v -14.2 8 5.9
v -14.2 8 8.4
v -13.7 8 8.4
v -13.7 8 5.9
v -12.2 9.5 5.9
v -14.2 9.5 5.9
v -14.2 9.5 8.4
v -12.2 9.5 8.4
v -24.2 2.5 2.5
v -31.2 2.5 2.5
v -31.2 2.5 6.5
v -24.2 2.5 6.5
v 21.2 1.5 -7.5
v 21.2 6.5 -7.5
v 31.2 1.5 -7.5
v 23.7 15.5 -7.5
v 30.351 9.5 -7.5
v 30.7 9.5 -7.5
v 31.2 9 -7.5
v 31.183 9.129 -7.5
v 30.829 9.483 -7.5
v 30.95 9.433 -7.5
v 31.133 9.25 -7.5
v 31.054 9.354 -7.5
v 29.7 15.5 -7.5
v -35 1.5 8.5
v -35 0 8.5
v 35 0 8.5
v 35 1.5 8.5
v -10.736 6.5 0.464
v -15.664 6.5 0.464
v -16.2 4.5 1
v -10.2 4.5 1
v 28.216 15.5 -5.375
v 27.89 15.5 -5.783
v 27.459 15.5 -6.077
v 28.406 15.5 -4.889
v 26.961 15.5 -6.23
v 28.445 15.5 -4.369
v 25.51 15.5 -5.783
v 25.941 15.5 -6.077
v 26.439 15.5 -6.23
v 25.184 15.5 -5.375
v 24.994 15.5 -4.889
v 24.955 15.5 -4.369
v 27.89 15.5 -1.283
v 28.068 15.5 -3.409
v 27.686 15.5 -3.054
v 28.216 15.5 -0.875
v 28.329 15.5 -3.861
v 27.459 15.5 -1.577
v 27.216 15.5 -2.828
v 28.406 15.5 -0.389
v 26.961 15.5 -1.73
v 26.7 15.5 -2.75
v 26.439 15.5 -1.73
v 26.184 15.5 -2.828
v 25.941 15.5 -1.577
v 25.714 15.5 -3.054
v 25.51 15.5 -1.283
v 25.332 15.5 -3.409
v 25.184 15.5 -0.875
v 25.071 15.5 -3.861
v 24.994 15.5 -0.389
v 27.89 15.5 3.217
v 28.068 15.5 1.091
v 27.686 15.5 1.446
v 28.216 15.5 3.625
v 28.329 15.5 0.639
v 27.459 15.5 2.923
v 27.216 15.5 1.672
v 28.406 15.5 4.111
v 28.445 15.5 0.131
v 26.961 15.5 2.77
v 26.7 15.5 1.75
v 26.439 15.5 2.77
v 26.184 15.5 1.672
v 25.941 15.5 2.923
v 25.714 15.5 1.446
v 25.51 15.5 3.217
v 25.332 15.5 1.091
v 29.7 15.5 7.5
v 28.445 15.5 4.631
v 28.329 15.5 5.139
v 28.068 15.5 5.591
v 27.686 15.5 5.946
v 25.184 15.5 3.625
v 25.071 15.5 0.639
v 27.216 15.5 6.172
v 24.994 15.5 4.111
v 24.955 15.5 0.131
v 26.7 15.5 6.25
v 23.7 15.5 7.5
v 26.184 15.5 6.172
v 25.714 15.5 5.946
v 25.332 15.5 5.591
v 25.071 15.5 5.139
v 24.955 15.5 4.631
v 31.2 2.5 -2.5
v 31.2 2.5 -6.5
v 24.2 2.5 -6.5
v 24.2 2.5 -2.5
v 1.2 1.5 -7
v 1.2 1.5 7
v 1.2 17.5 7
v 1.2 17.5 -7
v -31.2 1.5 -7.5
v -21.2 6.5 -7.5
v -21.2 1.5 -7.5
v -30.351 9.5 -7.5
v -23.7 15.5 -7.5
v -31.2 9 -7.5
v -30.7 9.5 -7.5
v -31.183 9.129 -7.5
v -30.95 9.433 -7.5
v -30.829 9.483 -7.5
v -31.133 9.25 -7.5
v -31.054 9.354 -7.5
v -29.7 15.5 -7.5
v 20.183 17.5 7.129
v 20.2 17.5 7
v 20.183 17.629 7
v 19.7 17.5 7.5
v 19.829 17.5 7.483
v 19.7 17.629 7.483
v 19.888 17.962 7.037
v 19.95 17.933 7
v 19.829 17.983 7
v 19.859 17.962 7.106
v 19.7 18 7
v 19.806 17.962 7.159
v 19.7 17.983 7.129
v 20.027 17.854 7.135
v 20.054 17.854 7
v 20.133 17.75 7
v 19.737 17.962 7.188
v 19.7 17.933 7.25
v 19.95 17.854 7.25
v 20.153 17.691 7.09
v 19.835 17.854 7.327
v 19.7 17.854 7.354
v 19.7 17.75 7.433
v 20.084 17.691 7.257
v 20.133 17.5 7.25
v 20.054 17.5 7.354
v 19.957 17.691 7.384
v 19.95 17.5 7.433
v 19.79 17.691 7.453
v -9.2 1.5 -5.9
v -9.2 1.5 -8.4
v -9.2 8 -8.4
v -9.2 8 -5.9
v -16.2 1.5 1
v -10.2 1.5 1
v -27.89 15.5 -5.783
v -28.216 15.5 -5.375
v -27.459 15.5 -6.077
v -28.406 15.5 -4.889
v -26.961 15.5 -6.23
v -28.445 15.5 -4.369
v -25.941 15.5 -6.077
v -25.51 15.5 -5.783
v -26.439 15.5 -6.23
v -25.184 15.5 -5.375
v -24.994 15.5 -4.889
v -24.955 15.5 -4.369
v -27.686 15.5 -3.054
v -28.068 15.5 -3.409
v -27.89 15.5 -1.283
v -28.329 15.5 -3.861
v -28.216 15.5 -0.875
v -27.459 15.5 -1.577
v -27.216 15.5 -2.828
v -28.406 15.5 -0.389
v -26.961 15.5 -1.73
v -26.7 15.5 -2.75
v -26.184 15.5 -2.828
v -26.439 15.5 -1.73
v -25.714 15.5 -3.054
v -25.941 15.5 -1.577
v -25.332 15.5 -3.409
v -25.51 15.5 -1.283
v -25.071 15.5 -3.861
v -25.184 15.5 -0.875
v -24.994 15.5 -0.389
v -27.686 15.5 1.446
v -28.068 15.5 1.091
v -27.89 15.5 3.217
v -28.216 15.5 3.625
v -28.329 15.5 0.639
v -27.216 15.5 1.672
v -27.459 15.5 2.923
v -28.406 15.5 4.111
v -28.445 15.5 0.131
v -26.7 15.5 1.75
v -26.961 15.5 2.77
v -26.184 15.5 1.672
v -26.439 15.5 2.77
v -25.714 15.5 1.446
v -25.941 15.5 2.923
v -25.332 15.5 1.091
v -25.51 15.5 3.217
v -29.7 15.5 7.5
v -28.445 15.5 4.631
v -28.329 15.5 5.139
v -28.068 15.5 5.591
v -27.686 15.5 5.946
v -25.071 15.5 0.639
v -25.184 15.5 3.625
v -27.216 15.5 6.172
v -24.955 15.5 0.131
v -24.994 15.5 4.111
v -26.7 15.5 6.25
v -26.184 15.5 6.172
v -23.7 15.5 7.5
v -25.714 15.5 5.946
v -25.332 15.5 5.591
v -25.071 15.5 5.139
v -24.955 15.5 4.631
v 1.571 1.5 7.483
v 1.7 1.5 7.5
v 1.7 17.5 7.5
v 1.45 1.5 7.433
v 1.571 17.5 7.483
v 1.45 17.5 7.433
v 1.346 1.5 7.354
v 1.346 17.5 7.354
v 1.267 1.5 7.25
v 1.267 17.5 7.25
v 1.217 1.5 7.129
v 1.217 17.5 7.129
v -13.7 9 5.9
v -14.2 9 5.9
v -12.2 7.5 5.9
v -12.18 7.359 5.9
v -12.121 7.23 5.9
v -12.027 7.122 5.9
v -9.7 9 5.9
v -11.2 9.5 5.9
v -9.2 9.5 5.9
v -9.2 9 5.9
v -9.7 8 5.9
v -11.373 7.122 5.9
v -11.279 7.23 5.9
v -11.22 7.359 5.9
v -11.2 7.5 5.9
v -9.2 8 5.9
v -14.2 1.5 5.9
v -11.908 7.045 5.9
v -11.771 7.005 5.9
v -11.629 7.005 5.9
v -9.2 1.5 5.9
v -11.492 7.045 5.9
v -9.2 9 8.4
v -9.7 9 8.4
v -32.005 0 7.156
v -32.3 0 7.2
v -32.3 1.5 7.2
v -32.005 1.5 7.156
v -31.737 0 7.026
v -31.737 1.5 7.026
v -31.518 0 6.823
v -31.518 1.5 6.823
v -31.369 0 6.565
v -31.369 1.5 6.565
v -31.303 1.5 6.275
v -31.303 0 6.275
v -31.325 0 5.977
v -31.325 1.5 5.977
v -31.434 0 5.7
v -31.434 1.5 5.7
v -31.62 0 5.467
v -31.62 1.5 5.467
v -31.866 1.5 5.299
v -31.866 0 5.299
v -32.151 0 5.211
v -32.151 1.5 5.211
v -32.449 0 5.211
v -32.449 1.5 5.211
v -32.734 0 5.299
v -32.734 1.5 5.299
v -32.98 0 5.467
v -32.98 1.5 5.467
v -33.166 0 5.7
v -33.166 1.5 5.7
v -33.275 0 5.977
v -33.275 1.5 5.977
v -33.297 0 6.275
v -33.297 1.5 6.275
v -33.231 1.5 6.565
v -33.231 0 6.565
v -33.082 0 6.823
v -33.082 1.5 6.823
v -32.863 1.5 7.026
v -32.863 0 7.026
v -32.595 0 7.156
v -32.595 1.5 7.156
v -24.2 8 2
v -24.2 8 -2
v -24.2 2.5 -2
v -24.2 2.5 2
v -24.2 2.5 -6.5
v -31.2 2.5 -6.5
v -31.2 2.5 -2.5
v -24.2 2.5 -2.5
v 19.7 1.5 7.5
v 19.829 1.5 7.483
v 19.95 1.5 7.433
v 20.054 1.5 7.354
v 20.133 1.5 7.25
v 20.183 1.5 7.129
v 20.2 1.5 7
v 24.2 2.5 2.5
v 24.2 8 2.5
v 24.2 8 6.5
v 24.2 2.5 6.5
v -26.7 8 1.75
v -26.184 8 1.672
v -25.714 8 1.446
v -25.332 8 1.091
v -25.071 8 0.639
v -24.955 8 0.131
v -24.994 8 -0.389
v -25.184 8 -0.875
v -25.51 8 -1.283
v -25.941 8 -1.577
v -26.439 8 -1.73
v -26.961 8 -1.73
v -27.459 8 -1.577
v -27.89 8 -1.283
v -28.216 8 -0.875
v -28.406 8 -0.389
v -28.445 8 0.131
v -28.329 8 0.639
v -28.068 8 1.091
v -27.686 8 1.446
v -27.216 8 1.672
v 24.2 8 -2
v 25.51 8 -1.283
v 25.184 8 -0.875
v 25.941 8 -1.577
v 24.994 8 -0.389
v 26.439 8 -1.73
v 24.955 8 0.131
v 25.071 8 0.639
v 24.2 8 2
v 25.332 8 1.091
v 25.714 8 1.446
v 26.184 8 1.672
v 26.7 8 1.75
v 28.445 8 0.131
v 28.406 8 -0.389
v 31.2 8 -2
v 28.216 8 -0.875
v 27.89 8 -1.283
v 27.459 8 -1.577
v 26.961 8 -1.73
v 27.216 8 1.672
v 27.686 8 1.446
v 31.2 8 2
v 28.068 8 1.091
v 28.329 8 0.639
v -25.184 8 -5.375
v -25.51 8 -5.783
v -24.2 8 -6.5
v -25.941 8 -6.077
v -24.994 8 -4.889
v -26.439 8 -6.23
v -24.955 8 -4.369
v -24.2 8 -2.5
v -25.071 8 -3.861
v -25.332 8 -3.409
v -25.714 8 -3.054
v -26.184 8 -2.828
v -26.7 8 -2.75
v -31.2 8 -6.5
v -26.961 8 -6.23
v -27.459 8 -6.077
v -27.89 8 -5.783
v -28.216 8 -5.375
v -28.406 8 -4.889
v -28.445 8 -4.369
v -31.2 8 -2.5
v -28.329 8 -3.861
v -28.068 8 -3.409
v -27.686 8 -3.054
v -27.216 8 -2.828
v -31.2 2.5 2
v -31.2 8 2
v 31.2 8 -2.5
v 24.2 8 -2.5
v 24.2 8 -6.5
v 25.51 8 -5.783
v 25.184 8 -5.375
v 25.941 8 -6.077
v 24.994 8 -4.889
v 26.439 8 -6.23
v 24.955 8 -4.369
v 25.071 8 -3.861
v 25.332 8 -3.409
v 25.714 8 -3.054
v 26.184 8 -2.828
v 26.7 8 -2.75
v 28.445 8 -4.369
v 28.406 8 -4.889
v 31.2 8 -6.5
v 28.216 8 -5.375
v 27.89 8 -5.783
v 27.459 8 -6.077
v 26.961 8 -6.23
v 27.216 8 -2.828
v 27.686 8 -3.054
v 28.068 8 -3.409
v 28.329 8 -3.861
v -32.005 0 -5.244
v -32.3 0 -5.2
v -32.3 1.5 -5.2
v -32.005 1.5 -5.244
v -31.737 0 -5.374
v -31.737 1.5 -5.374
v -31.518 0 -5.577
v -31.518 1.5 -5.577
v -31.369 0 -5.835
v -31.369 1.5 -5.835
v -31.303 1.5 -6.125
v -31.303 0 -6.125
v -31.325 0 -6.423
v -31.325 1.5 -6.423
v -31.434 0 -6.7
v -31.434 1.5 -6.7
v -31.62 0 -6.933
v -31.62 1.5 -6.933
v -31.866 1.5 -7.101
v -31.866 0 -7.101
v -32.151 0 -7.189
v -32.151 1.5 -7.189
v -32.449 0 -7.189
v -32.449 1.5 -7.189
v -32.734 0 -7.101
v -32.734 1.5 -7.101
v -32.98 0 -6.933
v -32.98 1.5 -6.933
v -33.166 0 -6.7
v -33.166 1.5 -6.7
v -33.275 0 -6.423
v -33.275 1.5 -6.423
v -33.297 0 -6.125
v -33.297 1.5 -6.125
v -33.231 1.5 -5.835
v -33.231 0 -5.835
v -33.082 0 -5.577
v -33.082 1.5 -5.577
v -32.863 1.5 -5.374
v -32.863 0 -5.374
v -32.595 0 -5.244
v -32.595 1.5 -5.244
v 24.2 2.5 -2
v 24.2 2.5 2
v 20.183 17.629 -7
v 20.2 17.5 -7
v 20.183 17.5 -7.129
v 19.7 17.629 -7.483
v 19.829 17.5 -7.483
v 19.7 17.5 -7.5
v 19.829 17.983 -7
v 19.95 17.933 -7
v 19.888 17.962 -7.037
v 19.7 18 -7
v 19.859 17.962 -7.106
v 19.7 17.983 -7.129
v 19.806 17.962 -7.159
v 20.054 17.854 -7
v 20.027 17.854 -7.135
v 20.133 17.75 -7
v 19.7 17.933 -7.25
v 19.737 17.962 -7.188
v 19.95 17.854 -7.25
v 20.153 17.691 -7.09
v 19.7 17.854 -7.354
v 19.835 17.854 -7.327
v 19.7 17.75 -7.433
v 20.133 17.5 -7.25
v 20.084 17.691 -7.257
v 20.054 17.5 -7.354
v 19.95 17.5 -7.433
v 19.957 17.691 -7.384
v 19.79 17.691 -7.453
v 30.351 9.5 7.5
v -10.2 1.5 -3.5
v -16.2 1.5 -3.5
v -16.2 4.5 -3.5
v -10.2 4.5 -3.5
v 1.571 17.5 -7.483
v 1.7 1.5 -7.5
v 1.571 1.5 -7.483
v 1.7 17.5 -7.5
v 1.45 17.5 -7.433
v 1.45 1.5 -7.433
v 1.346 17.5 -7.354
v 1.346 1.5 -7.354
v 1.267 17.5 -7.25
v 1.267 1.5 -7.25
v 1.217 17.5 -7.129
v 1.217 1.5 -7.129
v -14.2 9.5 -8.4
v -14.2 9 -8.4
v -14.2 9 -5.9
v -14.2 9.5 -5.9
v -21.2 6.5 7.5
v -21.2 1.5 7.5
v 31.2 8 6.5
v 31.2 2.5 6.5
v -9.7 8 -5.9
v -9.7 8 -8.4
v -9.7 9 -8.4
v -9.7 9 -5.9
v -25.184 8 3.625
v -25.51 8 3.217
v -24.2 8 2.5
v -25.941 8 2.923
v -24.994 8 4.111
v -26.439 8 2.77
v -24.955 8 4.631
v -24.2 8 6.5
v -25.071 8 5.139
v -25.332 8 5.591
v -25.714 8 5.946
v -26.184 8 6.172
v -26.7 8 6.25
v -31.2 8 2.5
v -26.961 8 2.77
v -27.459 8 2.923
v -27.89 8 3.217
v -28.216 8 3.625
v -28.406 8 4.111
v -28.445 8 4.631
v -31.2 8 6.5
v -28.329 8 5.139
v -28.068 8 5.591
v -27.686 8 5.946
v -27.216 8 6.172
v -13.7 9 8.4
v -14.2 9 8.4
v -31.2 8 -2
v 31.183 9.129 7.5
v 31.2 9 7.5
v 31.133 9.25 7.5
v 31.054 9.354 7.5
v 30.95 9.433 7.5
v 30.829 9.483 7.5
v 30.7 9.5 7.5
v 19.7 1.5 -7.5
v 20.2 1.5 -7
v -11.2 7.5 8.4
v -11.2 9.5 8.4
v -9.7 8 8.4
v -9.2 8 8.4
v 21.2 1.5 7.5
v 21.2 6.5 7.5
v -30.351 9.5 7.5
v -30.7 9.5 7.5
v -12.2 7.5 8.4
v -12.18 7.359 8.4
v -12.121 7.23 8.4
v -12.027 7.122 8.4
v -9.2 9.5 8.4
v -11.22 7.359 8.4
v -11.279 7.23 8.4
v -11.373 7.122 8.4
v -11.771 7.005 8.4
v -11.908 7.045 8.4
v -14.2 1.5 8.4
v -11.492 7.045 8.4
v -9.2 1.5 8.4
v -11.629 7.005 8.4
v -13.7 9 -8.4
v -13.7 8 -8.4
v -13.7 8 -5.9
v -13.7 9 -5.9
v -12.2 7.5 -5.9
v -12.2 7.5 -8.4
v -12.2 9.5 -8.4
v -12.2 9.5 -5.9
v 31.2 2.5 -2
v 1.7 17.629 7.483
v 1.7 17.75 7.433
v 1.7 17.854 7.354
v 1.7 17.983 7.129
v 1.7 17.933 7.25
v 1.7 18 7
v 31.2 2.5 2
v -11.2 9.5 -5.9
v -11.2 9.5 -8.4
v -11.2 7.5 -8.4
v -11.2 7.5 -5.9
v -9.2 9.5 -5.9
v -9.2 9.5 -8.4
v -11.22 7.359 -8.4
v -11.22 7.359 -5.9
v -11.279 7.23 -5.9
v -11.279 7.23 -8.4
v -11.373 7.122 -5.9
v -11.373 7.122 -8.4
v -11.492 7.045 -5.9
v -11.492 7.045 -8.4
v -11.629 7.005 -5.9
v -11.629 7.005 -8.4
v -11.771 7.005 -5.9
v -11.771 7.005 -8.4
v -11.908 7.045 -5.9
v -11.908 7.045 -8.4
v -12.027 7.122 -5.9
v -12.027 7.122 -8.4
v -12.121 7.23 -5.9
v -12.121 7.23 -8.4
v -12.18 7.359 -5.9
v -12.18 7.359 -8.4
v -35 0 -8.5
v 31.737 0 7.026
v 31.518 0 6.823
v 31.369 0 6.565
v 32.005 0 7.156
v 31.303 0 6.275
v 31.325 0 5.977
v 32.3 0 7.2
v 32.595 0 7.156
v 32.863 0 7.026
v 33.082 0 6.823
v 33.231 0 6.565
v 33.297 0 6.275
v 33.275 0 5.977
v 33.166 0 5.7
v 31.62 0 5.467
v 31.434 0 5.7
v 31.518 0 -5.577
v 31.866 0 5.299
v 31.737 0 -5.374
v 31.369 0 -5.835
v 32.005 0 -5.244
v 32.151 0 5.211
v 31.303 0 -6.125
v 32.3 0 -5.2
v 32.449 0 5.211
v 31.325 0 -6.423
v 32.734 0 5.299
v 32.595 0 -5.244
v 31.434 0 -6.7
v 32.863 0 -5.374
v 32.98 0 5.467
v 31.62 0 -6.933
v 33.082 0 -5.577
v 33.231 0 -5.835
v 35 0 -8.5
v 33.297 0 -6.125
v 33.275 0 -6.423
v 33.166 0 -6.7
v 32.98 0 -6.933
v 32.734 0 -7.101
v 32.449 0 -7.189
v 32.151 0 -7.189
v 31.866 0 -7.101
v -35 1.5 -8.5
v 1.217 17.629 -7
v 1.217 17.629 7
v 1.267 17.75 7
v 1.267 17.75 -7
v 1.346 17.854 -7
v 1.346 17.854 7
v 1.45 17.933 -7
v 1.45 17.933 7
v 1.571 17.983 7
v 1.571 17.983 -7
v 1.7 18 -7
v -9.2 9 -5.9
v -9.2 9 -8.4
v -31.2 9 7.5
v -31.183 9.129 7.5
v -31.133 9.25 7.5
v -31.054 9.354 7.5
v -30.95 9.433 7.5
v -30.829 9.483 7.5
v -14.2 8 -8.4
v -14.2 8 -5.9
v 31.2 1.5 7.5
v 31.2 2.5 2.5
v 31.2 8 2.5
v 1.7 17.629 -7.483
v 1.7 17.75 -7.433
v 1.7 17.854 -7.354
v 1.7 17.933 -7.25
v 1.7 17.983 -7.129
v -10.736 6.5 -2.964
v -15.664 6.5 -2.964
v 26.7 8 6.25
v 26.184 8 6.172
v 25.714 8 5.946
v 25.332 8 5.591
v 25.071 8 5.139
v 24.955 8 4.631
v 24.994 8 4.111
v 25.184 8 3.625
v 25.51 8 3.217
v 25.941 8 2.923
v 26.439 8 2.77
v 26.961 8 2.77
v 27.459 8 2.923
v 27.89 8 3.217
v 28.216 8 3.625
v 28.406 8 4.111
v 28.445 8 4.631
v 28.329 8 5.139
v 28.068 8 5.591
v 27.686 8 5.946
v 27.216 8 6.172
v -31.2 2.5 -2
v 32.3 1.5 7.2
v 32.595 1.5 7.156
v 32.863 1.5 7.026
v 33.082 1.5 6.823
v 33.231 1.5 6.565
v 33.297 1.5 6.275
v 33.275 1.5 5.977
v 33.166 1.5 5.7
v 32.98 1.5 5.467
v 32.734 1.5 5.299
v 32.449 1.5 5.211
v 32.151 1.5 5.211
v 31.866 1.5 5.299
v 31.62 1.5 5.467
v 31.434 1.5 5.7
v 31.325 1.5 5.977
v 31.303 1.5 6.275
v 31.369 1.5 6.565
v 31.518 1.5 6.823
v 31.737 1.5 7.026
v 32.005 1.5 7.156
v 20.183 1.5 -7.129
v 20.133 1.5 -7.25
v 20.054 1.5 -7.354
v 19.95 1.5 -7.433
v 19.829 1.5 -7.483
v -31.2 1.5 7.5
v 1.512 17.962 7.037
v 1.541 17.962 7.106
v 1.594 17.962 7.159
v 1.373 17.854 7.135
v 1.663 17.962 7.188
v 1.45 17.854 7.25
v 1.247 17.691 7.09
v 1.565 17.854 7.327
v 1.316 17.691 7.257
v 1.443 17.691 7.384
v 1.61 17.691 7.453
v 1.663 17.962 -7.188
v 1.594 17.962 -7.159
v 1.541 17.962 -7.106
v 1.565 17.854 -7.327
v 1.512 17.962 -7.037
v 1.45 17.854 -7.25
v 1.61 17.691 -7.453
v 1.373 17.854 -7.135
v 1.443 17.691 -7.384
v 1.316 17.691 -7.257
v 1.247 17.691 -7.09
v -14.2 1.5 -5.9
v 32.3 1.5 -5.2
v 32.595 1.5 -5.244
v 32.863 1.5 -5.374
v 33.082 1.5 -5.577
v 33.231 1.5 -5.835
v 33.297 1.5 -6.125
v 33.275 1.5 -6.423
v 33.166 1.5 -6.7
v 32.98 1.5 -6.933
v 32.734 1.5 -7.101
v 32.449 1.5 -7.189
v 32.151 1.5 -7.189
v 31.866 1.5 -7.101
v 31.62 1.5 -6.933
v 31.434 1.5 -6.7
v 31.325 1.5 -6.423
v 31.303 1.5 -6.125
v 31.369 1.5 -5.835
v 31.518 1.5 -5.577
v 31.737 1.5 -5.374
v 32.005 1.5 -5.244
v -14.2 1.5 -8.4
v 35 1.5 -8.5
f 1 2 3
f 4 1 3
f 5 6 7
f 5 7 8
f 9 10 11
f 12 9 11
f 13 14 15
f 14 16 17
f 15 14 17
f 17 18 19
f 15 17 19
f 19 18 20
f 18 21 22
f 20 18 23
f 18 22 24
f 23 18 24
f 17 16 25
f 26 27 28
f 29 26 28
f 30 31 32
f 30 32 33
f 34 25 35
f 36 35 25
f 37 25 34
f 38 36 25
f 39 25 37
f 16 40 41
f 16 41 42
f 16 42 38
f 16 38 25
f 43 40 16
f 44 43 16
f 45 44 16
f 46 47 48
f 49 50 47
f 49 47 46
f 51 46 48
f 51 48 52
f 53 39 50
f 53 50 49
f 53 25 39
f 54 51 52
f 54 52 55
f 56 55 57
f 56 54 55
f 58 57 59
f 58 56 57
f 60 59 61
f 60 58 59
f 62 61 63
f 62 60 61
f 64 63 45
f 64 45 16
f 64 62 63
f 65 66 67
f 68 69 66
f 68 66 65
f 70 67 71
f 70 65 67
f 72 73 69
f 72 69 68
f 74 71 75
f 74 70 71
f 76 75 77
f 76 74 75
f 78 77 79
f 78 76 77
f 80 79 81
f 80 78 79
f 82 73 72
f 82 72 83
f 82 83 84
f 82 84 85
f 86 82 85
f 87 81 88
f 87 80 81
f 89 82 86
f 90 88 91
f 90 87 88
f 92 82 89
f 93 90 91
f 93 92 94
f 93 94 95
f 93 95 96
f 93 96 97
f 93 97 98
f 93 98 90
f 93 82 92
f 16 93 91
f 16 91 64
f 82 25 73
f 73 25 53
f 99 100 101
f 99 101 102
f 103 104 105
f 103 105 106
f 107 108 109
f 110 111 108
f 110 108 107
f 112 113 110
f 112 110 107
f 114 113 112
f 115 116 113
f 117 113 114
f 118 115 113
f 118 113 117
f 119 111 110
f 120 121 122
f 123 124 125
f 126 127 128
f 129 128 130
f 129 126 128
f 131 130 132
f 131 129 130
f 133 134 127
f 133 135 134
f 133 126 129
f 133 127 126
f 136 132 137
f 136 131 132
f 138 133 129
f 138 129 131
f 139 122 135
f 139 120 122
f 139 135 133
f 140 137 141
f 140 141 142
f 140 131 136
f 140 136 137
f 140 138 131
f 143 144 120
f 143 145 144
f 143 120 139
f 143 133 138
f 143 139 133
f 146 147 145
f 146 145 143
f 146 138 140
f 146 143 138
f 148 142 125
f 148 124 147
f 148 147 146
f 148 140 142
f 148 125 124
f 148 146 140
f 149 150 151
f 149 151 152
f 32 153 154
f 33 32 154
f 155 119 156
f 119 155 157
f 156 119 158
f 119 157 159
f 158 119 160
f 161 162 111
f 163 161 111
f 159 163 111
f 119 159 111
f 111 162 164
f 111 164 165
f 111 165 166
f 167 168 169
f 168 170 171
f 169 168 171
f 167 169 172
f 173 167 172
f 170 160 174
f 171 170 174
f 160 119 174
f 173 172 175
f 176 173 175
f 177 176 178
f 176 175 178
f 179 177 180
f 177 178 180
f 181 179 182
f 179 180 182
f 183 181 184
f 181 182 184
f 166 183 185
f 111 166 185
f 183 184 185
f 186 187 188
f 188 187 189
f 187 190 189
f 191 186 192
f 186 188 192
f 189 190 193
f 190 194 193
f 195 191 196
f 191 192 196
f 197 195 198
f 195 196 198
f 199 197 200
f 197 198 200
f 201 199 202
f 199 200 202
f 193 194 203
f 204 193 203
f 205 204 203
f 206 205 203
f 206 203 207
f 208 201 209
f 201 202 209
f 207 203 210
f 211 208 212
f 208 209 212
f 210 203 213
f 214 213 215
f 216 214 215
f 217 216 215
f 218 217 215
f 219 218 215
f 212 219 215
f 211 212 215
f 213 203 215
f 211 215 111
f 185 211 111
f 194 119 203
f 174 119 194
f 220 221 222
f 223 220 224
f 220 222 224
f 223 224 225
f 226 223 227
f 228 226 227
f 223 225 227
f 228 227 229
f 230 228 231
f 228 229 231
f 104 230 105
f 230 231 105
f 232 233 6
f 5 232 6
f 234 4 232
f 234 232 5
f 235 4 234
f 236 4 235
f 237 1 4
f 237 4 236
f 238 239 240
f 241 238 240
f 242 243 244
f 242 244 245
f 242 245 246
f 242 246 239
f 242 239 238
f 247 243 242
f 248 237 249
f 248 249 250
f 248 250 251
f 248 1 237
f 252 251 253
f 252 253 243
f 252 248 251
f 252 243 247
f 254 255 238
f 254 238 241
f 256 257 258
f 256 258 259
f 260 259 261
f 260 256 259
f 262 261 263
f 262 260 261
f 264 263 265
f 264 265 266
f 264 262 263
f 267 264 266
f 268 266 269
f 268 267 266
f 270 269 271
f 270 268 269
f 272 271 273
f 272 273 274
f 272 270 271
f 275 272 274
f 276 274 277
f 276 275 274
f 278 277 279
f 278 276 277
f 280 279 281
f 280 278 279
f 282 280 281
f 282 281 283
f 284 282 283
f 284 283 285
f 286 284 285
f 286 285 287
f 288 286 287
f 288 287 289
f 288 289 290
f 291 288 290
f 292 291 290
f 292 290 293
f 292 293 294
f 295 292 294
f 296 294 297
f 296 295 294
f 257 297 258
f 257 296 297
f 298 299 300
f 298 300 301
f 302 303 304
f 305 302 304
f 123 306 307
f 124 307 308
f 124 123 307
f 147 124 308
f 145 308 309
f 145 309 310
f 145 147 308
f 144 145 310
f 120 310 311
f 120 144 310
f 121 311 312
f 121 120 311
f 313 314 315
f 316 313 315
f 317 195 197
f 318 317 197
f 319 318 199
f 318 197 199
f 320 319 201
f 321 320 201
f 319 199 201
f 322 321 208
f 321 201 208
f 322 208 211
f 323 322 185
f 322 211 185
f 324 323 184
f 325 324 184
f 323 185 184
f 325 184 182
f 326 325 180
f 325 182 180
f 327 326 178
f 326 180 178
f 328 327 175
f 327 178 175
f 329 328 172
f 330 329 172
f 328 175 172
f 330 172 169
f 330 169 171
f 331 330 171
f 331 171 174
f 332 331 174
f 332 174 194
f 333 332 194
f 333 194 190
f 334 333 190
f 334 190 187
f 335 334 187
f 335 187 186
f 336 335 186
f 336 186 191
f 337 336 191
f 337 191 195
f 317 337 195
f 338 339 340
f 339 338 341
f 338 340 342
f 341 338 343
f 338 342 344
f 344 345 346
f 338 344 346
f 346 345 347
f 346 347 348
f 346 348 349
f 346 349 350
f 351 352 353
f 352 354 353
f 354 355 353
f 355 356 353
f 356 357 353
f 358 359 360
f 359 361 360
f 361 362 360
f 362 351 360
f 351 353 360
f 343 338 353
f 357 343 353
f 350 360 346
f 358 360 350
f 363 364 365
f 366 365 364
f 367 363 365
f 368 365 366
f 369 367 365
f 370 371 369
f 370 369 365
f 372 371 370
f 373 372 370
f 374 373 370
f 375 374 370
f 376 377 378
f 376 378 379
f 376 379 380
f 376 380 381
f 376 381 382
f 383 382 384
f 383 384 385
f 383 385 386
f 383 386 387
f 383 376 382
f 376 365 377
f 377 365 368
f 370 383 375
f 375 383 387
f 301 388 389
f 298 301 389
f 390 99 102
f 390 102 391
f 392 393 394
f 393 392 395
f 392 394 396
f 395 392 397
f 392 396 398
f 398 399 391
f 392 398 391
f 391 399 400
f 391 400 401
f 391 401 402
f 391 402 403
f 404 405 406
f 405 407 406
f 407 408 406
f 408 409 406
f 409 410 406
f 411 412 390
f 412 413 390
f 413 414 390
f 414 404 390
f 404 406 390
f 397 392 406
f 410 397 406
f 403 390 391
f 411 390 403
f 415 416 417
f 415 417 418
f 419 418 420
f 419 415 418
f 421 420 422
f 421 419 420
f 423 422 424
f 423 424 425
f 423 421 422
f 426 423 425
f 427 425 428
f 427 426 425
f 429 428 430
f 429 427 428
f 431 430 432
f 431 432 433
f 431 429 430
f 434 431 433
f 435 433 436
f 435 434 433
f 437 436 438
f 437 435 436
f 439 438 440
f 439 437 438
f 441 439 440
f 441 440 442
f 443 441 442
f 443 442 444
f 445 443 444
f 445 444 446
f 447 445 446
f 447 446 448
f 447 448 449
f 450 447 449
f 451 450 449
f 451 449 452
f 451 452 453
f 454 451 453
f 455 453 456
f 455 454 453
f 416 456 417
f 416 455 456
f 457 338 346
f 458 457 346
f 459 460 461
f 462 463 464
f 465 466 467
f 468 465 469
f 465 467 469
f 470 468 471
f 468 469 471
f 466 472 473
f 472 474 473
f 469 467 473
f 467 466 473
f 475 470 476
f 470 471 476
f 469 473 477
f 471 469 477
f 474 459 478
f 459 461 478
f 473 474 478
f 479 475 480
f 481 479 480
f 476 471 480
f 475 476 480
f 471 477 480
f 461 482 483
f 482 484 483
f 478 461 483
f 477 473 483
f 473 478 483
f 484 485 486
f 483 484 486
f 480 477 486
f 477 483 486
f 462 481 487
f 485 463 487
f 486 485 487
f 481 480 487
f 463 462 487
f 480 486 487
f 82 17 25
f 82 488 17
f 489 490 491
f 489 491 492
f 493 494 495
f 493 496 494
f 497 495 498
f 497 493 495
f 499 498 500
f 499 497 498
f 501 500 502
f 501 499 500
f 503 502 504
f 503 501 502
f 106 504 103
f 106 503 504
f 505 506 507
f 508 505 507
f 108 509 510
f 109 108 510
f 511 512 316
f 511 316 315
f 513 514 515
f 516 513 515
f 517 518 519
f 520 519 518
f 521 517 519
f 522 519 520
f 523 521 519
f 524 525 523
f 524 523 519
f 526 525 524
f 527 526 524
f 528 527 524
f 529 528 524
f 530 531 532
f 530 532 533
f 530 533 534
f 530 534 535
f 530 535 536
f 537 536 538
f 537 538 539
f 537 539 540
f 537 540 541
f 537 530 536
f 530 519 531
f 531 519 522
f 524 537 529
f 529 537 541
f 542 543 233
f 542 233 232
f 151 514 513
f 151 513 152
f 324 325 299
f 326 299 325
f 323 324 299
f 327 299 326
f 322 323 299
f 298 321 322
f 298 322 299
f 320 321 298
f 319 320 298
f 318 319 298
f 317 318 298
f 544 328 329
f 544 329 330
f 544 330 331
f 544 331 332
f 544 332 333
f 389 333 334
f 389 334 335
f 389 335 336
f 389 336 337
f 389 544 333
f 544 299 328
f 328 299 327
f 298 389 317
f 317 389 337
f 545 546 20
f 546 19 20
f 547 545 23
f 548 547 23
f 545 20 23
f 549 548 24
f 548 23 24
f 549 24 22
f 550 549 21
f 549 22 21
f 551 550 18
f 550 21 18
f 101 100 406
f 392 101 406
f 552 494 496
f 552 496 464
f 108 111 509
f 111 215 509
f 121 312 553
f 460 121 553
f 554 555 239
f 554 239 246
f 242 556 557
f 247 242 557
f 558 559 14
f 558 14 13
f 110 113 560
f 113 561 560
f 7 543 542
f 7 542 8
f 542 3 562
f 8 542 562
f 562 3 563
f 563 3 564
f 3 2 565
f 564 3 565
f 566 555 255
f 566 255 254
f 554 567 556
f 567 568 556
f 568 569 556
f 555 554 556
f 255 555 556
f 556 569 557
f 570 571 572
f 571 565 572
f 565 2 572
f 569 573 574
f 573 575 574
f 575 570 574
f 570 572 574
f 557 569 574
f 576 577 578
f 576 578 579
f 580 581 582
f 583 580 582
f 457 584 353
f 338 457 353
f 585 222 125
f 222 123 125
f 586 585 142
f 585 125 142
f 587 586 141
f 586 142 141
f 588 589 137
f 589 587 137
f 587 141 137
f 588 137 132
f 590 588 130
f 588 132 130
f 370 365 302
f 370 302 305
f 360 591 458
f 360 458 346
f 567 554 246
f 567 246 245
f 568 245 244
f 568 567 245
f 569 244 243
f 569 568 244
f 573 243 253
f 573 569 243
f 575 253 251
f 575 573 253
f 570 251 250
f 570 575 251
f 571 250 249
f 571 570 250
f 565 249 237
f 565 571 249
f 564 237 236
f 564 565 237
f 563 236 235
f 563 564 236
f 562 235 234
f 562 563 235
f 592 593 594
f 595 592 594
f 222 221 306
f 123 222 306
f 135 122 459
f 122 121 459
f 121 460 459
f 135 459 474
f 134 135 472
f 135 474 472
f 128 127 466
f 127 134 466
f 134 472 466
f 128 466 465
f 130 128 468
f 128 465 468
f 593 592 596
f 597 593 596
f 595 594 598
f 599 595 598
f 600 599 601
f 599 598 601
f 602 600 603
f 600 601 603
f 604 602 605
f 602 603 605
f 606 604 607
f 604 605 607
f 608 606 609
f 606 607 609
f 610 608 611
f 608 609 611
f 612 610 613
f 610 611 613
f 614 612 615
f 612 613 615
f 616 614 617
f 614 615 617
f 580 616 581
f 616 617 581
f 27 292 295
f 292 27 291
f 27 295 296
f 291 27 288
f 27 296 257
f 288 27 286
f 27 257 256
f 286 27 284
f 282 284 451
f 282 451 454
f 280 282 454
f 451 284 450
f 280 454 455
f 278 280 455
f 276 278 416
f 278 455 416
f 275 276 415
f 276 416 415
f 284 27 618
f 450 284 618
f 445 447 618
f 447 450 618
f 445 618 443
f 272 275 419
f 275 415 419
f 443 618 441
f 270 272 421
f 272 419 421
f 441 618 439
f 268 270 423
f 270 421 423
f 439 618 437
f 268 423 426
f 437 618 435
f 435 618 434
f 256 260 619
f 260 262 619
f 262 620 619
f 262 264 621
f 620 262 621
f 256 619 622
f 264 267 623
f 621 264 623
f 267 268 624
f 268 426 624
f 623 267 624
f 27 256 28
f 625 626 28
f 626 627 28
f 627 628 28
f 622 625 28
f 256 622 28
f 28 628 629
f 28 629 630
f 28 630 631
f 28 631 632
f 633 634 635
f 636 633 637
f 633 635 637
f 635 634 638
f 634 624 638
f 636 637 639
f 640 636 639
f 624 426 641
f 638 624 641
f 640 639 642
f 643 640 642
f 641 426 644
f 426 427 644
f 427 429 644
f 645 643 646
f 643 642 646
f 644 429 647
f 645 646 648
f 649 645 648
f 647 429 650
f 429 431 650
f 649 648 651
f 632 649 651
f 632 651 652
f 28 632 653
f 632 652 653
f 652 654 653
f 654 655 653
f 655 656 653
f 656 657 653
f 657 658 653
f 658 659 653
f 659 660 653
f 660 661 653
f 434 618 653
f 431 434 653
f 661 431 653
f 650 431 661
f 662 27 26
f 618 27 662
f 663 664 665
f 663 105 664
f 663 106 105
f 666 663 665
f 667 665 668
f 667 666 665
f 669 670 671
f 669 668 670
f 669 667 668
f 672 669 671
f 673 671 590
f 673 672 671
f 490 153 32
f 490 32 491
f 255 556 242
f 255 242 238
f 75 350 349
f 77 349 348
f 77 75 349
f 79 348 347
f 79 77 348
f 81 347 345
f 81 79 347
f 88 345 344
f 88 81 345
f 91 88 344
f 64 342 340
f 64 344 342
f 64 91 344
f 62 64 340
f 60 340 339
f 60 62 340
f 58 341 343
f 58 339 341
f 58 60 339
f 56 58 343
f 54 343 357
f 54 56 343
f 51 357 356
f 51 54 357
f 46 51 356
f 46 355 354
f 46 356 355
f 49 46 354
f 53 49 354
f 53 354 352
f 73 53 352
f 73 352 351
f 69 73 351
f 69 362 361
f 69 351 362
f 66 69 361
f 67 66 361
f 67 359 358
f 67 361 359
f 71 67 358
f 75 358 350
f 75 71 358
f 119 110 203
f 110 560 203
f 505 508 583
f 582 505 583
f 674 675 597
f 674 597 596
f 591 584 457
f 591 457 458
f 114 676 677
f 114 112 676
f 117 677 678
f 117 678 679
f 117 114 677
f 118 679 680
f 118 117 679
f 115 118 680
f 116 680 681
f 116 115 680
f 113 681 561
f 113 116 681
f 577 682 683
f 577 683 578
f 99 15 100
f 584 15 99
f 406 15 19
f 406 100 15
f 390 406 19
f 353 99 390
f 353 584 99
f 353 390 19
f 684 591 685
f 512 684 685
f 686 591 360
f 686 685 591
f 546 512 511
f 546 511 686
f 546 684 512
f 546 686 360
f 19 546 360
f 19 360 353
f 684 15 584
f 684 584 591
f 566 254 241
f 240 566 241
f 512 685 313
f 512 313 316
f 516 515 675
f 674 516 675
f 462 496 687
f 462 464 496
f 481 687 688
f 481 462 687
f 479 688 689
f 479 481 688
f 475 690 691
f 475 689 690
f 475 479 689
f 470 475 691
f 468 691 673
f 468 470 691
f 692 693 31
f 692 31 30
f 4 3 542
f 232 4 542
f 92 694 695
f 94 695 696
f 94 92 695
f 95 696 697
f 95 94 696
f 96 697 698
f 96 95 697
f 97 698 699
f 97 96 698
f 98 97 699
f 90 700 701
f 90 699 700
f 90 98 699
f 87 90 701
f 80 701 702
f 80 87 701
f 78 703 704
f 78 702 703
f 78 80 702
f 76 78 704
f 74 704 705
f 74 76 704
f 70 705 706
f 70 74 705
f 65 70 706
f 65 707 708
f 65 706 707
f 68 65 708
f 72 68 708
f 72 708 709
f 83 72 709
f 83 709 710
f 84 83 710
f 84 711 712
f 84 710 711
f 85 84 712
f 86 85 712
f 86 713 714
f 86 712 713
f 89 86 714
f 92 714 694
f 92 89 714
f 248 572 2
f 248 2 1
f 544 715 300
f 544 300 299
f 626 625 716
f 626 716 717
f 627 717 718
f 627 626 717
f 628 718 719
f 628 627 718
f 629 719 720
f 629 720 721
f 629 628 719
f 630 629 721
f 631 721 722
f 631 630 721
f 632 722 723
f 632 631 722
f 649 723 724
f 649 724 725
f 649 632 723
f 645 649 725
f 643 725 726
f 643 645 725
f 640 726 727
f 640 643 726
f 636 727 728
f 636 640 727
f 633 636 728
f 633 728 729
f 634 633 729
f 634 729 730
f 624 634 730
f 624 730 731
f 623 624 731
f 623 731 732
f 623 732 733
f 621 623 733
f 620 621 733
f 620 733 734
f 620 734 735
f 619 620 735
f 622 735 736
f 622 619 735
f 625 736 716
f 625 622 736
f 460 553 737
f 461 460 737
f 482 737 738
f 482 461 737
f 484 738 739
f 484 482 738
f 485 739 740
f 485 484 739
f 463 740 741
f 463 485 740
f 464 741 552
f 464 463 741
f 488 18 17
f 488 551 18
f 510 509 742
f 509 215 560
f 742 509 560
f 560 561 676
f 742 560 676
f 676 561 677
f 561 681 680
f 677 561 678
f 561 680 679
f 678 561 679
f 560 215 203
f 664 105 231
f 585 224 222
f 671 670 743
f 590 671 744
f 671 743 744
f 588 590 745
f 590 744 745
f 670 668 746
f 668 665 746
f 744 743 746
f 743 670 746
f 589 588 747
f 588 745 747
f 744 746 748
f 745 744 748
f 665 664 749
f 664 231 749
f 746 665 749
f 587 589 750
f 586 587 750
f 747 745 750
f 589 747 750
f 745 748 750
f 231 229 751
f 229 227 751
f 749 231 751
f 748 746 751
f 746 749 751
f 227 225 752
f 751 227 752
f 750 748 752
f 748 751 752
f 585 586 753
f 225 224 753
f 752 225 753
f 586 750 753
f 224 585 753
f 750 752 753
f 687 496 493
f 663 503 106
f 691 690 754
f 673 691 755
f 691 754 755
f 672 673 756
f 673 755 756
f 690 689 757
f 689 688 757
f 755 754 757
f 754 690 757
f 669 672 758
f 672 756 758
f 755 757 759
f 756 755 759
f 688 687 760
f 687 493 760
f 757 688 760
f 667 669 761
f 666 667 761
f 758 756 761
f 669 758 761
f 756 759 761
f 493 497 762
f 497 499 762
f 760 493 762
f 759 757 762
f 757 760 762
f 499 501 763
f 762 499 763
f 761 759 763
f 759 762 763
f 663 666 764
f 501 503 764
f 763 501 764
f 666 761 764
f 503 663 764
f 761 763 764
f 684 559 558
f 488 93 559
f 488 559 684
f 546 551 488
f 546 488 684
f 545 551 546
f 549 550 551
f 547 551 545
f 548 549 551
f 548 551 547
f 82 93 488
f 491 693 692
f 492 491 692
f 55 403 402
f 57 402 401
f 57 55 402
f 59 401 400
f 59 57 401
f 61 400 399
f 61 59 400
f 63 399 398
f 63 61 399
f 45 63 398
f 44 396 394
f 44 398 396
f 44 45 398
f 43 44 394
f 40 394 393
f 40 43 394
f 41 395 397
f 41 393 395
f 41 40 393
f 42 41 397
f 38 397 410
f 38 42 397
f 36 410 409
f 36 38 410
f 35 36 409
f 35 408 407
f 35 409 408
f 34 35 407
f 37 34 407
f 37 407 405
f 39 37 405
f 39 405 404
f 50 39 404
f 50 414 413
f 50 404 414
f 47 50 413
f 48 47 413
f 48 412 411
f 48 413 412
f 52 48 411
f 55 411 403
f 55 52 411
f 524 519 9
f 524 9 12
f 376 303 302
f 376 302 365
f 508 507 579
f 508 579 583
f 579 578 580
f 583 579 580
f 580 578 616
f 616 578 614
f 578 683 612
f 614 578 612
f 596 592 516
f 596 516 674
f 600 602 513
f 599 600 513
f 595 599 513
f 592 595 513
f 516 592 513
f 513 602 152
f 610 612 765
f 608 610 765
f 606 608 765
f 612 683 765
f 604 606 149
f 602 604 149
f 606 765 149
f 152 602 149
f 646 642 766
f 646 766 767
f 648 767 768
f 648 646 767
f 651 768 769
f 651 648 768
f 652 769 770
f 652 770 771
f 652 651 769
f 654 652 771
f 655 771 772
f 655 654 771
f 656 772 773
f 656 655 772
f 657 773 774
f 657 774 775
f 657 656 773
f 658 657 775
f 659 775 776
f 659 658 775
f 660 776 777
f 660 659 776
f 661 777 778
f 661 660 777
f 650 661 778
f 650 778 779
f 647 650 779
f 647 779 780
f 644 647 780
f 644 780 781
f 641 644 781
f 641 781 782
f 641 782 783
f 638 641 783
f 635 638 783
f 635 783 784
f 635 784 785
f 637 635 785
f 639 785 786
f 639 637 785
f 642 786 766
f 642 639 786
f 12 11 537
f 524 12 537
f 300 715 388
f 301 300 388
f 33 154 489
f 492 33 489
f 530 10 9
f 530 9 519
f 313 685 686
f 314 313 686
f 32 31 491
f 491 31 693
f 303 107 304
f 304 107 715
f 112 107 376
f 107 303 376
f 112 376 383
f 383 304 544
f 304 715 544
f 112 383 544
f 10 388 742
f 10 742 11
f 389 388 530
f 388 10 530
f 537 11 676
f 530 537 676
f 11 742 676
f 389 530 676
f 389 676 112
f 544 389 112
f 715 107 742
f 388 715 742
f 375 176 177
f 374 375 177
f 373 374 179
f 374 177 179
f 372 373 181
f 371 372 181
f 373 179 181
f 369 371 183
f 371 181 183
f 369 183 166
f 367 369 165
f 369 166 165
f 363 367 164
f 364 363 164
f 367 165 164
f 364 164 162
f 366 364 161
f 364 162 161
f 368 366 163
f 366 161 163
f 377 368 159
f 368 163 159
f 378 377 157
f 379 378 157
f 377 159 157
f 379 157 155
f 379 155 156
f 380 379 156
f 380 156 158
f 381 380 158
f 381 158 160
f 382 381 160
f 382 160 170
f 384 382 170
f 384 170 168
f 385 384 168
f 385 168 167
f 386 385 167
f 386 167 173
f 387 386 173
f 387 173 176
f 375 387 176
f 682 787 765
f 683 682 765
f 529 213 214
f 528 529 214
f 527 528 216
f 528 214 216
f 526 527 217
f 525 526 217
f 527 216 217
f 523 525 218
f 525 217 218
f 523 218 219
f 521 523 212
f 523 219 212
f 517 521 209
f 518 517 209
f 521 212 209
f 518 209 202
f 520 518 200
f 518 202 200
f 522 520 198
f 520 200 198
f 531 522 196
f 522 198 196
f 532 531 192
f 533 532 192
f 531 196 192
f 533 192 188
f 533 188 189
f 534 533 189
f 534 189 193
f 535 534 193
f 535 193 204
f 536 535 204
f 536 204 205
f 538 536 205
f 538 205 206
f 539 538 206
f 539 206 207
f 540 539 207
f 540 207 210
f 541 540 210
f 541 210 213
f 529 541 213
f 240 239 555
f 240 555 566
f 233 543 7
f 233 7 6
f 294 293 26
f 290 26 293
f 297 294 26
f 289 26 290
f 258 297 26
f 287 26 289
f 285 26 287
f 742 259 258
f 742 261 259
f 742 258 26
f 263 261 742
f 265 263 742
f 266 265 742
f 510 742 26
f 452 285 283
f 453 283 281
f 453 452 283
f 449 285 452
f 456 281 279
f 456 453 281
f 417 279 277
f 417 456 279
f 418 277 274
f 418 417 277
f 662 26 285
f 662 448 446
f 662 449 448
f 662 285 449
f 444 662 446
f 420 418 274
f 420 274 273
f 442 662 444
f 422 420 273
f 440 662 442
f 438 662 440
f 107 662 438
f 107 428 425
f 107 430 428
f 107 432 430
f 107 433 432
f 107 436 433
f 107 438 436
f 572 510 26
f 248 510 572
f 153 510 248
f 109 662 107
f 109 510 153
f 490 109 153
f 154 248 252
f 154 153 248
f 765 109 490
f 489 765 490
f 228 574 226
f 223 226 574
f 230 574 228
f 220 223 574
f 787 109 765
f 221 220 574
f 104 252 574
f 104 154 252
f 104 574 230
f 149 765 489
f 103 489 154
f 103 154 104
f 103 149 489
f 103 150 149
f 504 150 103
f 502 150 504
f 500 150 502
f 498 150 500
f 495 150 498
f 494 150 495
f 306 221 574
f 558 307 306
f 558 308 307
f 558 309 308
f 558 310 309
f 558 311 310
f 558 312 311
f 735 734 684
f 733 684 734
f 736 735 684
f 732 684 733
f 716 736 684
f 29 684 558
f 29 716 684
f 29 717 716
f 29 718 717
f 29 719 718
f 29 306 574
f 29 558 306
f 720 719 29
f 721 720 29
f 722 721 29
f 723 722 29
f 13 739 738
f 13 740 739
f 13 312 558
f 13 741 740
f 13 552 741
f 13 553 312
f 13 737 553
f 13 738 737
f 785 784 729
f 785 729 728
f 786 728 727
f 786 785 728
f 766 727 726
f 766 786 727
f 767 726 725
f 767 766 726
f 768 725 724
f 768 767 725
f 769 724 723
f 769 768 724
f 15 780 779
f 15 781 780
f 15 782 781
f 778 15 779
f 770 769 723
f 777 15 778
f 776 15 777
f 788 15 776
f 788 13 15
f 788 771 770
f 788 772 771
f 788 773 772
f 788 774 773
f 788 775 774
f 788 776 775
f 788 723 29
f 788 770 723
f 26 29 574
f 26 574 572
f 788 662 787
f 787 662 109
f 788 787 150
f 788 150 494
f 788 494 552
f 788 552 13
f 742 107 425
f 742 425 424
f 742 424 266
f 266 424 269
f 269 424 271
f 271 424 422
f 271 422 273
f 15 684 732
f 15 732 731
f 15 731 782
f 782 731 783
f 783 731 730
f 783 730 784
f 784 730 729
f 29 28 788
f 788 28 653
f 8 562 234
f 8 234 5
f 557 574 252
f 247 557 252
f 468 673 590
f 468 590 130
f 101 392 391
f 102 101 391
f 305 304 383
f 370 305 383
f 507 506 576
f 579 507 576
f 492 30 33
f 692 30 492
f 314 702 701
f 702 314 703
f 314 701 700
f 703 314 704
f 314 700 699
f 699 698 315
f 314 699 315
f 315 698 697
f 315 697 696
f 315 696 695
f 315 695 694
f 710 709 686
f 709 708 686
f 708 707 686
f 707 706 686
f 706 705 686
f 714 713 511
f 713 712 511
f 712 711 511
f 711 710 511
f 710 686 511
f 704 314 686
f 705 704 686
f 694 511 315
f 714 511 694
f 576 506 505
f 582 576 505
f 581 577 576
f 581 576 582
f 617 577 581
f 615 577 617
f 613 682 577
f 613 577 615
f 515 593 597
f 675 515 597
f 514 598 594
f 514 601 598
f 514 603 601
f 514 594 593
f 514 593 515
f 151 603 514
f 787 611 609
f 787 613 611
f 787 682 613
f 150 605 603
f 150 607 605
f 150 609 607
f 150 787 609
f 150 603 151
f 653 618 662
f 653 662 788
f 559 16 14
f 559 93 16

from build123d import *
from OCP.BRepFilletAPI import BRepFilletAPI_MakeChamfer

# Parameters (mm, degrees)
SKETCH1_W            = 70
SKETCH1_H            = 17
SKETCH1_R            = 1
BOSS_EXTRUDE1_DEPTH  = 1.5
BOSS_EXTRUDE2_DEPTH  = 7.5
FILLET1_R            = 0.5
SKETCH3_R            = 1.75
CUT_EXTRUDE1_DEPTH   = 11
SKETCH4_W            = 4
SKETCH4_H            = 5.5
CUT_EXTRUDE2_DEPTH   = 7
FILLET1_OF_MIRROR1_R = 0.5
SKETCH5_W            = 19
SKETCH5_H            = 15
BOSS_EXTRUDE3_DEPTH  = 16.5
FILLET2_R            = 0.5
SKETCH6_W            = 6
SKETCH6_H            = 4.5
BOSS_EXTRUDE4_DEPTH  = 5
CHAMFER1_SIZE        = 2
CHAMFER1_SIZE2       = 0.535898385
SKETCH7_W            = 5
SKETCH7_H            = 2.5
BOSS_EXTRUDE5_DEPTH  = 8
CUT_EXTRUDE3_REACH   = 44.832
SKETCH8_W            = 0.5
SKETCH8_H            = 1


with BuildPart() as part:
    # Sketch1 → Boss-Extrude1 (new body)
    with BuildSketch(Plane(origin=(0, 0, 0), x_dir=(1, 0, 0), z_dir=(0, 1, 0))):
        Rectangle(SKETCH1_W, SKETCH1_H)
        with Locations(Location((-32.3, 6.2, 0), (0, 0, 270))):
            Circle(SKETCH1_R, mode=Mode.SUBTRACT)
        with Locations(Location((32.3, 6.2, 0), (0, 0, 270))):
            Circle(SKETCH1_R, mode=Mode.SUBTRACT)
        with Locations(Location((32.3, -6.2, 0), (0, 0, 270))):
            Circle(SKETCH1_R, mode=Mode.SUBTRACT)
        with Locations(Location((-32.3, -6.2, 0), (0, 0, 270))):
            Circle(SKETCH1_R, mode=Mode.SUBTRACT)
    extrude(amount=BOSS_EXTRUDE1_DEPTH)

    # Sketch2 → Boss-Extrude2 (add, symmetric)
    with BuildSketch(Plane.XY):
        Polygon((-31.2, 1.5), (-31.2, 9.5), (-30.350716041, 9.5), (-29.7, 15.5), (-23.7, 15.5), (-21.2, 6.5), (-21.2, 1.5), align=None)
    boss_extrude2 = extrude(amount=BOSS_EXTRUDE2_DEPTH, both=True)

    # Fillet1
    fillet1_edges = [part.edges().sort_by_distance(p)[0] for p in [
        (-31.2, 9.5, 0),
    ]]
    fillet(fillet1_edges, radius=FILLET1_R)

    # Sketch3 → Cut-Extrude1 (cut)
    with BuildSketch(Plane(origin=(0, 15.5, 0), x_dir=(1, 0, 0), z_dir=(0, 1, 0))):
        with Locations(Location((-26.7, 4.5, 0), (0, 0, 270))):
            Circle(SKETCH3_R)
        with Locations(Location((-26.7, 0, 0), (0, 0, 270))):
            Circle(SKETCH3_R)
        with Locations(Location((-26.7, -4.5, 0), (0, 0, 270))):
            Circle(SKETCH3_R)
    cut_extrude1 = extrude(amount=-CUT_EXTRUDE1_DEPTH, mode=Mode.SUBTRACT)

    # Sketch4 → Cut-Extrude2 (cut)
    with BuildSketch(Plane.ZY.offset(31.2)):
        with Locations((-4.5, 5.25)):
            Rectangle(SKETCH4_W, SKETCH4_H)
        with Locations((0, 5.25)):
            Rectangle(SKETCH4_W, SKETCH4_H)
        with Locations((4.5, 5.25)):
            Rectangle(SKETCH4_W, SKETCH4_H)
    cut_extrude2 = extrude(amount=-CUT_EXTRUDE2_DEPTH, mode=Mode.SUBTRACT)

    # Mirror1: Boss-Extrude2, Cut-Extrude1, Cut-Extrude2 across plane
    add(boss_extrude2.mirror(Plane(origin=(0, 0, 0), x_dir=(0, 0, 1), z_dir=(1, 0, 0))))
    add(cut_extrude1.mirror(Plane(origin=(0, 0, 0), x_dir=(0, 0, 1), z_dir=(1, 0, 0))), mode=Mode.SUBTRACT)
    add(cut_extrude2.mirror(Plane(origin=(0, 0, 0), x_dir=(0, 0, 1), z_dir=(1, 0, 0))), mode=Mode.SUBTRACT)

    # Fillet1 of Mirror1
    fillet1_of_mirror1_edges = [part.edges().sort_by_distance(p)[0] for p in [
        (31.2, 9.5, 0),
    ]]
    fillet(fillet1_of_mirror1_edges, radius=FILLET1_OF_MIRROR1_R)

    # Sketch5 → Boss-Extrude3 (add)
    with BuildSketch(Plane(origin=(0, 1.5, 0), x_dir=(1, 0, 0), z_dir=(0, 1, 0))):
        with Locations((10.7, 0)):
            Rectangle(SKETCH5_W, SKETCH5_H)
    extrude(amount=BOSS_EXTRUDE3_DEPTH)

    # Fillet2
    fillet2_edges = [part.edges().sort_by_distance(p)[0] for p in [
        (20.2, 9.75, 7.5),
        (20.2, 9.75, -7.5),
        (1.2, 9.75, -7.5),
        (1.2, 9.75, 7.5),
        (20.2, 18, 0),
        (10.7, 18, -7.5),
        (1.2, 18, 0),
        (10.7, 18, 7.5),
    ]]
    fillet(fillet2_edges, radius=FILLET2_R)

    # Sketch6 → Boss-Extrude4 (add)
    with BuildSketch(Plane(origin=(0, 1.5, 0), x_dir=(1, 0, 0), z_dir=(0, 1, 0))):
        with Locations((-13.2, 1.25)):
            Rectangle(SKETCH6_W, SKETCH6_H)
    extrude(amount=BOSS_EXTRUDE4_DEPTH)

    # Chamfer1: one chamfer whose edges measure the first distance from different faces: ONE call of the kernel's chamfer builder (chamfer() names one face for all edges)
    chamfer1_edges_1 = [part.edges().sort_by_distance(p)[0] for p in [
        (-16.2, 6.5, -1.25),
    ]]
    chamfer1_side_1 = [part.faces().sort_by_distance(p)[0] for p in [
        (-16.2, 4, -1.25),
    ]]
    chamfer1_edges_2 = [part.edges().sort_by_distance(p)[0] for p in [
        (-13.2, 6.5, 1),
    ]]
    chamfer1_side_2 = [part.faces().sort_by_distance(p)[0] for p in [
        (-13.2, 4, 1),
    ]]
    chamfer1_edges_3 = [part.edges().sort_by_distance(p)[0] for p in [
        (-10.2, 6.5, -1.25),
    ]]
    chamfer1_side_3 = [part.faces().sort_by_distance(p)[0] for p in [
        (-10.2, 4, -1.25),
    ]]
    chamfer1_edges_4 = [part.edges().sort_by_distance(p)[0] for p in [
        (-13.2, 6.5, -3.5),
    ]]
    chamfer1_side_4 = [part.faces().sort_by_distance(p)[0] for p in [
        (-13.2, 4, -3.5),
    ]]
    chamfer1 = BRepFilletAPI_MakeChamfer(part.part.solid().wrapped)
    for e in chamfer1_edges_1:
        chamfer1.Add(CHAMFER1_SIZE, CHAMFER1_SIZE2, e.wrapped, chamfer1_side_1[0].wrapped)  # the first distance lies on this face
    for e in chamfer1_edges_2:
        chamfer1.Add(CHAMFER1_SIZE, CHAMFER1_SIZE2, e.wrapped, chamfer1_side_2[0].wrapped)  # the first distance lies on this face
    for e in chamfer1_edges_3:
        chamfer1.Add(CHAMFER1_SIZE, CHAMFER1_SIZE2, e.wrapped, chamfer1_side_3[0].wrapped)  # the first distance lies on this face
    for e in chamfer1_edges_4:
        chamfer1.Add(CHAMFER1_SIZE, CHAMFER1_SIZE2, e.wrapped, chamfer1_side_4[0].wrapped)  # the first distance lies on this face
    add(Compound.cast(chamfer1.Shape()), mode=Mode.REPLACE)

    # Sketch7 → Boss-Extrude5 (add)
    with BuildSketch(Plane(origin=(0, 1.5, 0), x_dir=(1, 0, 0), z_dir=(0, 1, 0))):
        with Locations((-11.7, -7.15)):
            Rectangle(SKETCH7_W, SKETCH7_H)
    boss_extrude5 = extrude(amount=BOSS_EXTRUDE5_DEPTH)

    # Sketch8 → Cut-Extrude3 (cut, up to next)
    with BuildSketch(Plane.XY.offset(8.4), mode=Mode.PRIVATE) as cut_extrude3_sk1:
        with Locations((-13.95, 8.5)):
            Rectangle(SKETCH8_W, SKETCH8_H)
    cut_extrude3_tool1 = extrude(cut_extrude3_sk1.sketch, amount=-CUT_EXTRUDE3_REACH, mode=Mode.PRIVATE) & part.part
    # Sketch8 → Cut-Extrude3 (cut, up to next)
    with BuildSketch(Plane.XY.offset(8.4), mode=Mode.PRIVATE) as cut_extrude3_sk2:
        with BuildLine():
            Line((-12.2, 7.5), (-12.2, 9.5))
            Line((-12.2, 9.5), (-11.2, 9.5))
            Line((-11.2, 9.5), (-11.2, 7.5))
            ThreePointArc((-11.2, 7.5), (-11.7, 7), (-12.2, 7.5))
        make_face()
    cut_extrude3_tool2 = extrude(cut_extrude3_sk2.sketch, amount=-CUT_EXTRUDE3_REACH, mode=Mode.PRIVATE) & part.part
    # Sketch8 → Cut-Extrude3 (cut, up to next)
    with BuildSketch(Plane.XY.offset(8.4), mode=Mode.PRIVATE) as cut_extrude3_sk3:
        with Locations((-9.45, 8.5)):
            Rectangle(SKETCH8_W, SKETCH8_H)
    cut_extrude3_tool3 = extrude(cut_extrude3_sk3.sketch, amount=-CUT_EXTRUDE3_REACH, mode=Mode.PRIVATE) & part.part
    cut_extrude3_1 = cut_extrude3_tool1.solids().sort_by_distance((-13.95, 8.5, 8.4))[0]
    add(cut_extrude3_1, mode=Mode.SUBTRACT)
    cut_extrude3_2 = cut_extrude3_tool2.solids().sort_by_distance((-11.7, 8.301048, 8.4))[0]
    add(cut_extrude3_2, mode=Mode.SUBTRACT)
    cut_extrude3_3 = cut_extrude3_tool3.solids().sort_by_distance((-9.45, 8.5, 8.4))[0]
    add(cut_extrude3_3, mode=Mode.SUBTRACT)
    cut_extrude3 = cut_extrude3_1 + cut_extrude3_2 + cut_extrude3_3  # Cut-Extrude3 as one shape, for the pattern or mirror that repeats it

    # Mirror2: Boss-Extrude5, Cut-Extrude3 across plane
    add(boss_extrude5.mirror(Plane.XY))
    add(cut_extrude3.mirror(Plane.XY), mode=Mode.SUBTRACT)


solid = part.part
